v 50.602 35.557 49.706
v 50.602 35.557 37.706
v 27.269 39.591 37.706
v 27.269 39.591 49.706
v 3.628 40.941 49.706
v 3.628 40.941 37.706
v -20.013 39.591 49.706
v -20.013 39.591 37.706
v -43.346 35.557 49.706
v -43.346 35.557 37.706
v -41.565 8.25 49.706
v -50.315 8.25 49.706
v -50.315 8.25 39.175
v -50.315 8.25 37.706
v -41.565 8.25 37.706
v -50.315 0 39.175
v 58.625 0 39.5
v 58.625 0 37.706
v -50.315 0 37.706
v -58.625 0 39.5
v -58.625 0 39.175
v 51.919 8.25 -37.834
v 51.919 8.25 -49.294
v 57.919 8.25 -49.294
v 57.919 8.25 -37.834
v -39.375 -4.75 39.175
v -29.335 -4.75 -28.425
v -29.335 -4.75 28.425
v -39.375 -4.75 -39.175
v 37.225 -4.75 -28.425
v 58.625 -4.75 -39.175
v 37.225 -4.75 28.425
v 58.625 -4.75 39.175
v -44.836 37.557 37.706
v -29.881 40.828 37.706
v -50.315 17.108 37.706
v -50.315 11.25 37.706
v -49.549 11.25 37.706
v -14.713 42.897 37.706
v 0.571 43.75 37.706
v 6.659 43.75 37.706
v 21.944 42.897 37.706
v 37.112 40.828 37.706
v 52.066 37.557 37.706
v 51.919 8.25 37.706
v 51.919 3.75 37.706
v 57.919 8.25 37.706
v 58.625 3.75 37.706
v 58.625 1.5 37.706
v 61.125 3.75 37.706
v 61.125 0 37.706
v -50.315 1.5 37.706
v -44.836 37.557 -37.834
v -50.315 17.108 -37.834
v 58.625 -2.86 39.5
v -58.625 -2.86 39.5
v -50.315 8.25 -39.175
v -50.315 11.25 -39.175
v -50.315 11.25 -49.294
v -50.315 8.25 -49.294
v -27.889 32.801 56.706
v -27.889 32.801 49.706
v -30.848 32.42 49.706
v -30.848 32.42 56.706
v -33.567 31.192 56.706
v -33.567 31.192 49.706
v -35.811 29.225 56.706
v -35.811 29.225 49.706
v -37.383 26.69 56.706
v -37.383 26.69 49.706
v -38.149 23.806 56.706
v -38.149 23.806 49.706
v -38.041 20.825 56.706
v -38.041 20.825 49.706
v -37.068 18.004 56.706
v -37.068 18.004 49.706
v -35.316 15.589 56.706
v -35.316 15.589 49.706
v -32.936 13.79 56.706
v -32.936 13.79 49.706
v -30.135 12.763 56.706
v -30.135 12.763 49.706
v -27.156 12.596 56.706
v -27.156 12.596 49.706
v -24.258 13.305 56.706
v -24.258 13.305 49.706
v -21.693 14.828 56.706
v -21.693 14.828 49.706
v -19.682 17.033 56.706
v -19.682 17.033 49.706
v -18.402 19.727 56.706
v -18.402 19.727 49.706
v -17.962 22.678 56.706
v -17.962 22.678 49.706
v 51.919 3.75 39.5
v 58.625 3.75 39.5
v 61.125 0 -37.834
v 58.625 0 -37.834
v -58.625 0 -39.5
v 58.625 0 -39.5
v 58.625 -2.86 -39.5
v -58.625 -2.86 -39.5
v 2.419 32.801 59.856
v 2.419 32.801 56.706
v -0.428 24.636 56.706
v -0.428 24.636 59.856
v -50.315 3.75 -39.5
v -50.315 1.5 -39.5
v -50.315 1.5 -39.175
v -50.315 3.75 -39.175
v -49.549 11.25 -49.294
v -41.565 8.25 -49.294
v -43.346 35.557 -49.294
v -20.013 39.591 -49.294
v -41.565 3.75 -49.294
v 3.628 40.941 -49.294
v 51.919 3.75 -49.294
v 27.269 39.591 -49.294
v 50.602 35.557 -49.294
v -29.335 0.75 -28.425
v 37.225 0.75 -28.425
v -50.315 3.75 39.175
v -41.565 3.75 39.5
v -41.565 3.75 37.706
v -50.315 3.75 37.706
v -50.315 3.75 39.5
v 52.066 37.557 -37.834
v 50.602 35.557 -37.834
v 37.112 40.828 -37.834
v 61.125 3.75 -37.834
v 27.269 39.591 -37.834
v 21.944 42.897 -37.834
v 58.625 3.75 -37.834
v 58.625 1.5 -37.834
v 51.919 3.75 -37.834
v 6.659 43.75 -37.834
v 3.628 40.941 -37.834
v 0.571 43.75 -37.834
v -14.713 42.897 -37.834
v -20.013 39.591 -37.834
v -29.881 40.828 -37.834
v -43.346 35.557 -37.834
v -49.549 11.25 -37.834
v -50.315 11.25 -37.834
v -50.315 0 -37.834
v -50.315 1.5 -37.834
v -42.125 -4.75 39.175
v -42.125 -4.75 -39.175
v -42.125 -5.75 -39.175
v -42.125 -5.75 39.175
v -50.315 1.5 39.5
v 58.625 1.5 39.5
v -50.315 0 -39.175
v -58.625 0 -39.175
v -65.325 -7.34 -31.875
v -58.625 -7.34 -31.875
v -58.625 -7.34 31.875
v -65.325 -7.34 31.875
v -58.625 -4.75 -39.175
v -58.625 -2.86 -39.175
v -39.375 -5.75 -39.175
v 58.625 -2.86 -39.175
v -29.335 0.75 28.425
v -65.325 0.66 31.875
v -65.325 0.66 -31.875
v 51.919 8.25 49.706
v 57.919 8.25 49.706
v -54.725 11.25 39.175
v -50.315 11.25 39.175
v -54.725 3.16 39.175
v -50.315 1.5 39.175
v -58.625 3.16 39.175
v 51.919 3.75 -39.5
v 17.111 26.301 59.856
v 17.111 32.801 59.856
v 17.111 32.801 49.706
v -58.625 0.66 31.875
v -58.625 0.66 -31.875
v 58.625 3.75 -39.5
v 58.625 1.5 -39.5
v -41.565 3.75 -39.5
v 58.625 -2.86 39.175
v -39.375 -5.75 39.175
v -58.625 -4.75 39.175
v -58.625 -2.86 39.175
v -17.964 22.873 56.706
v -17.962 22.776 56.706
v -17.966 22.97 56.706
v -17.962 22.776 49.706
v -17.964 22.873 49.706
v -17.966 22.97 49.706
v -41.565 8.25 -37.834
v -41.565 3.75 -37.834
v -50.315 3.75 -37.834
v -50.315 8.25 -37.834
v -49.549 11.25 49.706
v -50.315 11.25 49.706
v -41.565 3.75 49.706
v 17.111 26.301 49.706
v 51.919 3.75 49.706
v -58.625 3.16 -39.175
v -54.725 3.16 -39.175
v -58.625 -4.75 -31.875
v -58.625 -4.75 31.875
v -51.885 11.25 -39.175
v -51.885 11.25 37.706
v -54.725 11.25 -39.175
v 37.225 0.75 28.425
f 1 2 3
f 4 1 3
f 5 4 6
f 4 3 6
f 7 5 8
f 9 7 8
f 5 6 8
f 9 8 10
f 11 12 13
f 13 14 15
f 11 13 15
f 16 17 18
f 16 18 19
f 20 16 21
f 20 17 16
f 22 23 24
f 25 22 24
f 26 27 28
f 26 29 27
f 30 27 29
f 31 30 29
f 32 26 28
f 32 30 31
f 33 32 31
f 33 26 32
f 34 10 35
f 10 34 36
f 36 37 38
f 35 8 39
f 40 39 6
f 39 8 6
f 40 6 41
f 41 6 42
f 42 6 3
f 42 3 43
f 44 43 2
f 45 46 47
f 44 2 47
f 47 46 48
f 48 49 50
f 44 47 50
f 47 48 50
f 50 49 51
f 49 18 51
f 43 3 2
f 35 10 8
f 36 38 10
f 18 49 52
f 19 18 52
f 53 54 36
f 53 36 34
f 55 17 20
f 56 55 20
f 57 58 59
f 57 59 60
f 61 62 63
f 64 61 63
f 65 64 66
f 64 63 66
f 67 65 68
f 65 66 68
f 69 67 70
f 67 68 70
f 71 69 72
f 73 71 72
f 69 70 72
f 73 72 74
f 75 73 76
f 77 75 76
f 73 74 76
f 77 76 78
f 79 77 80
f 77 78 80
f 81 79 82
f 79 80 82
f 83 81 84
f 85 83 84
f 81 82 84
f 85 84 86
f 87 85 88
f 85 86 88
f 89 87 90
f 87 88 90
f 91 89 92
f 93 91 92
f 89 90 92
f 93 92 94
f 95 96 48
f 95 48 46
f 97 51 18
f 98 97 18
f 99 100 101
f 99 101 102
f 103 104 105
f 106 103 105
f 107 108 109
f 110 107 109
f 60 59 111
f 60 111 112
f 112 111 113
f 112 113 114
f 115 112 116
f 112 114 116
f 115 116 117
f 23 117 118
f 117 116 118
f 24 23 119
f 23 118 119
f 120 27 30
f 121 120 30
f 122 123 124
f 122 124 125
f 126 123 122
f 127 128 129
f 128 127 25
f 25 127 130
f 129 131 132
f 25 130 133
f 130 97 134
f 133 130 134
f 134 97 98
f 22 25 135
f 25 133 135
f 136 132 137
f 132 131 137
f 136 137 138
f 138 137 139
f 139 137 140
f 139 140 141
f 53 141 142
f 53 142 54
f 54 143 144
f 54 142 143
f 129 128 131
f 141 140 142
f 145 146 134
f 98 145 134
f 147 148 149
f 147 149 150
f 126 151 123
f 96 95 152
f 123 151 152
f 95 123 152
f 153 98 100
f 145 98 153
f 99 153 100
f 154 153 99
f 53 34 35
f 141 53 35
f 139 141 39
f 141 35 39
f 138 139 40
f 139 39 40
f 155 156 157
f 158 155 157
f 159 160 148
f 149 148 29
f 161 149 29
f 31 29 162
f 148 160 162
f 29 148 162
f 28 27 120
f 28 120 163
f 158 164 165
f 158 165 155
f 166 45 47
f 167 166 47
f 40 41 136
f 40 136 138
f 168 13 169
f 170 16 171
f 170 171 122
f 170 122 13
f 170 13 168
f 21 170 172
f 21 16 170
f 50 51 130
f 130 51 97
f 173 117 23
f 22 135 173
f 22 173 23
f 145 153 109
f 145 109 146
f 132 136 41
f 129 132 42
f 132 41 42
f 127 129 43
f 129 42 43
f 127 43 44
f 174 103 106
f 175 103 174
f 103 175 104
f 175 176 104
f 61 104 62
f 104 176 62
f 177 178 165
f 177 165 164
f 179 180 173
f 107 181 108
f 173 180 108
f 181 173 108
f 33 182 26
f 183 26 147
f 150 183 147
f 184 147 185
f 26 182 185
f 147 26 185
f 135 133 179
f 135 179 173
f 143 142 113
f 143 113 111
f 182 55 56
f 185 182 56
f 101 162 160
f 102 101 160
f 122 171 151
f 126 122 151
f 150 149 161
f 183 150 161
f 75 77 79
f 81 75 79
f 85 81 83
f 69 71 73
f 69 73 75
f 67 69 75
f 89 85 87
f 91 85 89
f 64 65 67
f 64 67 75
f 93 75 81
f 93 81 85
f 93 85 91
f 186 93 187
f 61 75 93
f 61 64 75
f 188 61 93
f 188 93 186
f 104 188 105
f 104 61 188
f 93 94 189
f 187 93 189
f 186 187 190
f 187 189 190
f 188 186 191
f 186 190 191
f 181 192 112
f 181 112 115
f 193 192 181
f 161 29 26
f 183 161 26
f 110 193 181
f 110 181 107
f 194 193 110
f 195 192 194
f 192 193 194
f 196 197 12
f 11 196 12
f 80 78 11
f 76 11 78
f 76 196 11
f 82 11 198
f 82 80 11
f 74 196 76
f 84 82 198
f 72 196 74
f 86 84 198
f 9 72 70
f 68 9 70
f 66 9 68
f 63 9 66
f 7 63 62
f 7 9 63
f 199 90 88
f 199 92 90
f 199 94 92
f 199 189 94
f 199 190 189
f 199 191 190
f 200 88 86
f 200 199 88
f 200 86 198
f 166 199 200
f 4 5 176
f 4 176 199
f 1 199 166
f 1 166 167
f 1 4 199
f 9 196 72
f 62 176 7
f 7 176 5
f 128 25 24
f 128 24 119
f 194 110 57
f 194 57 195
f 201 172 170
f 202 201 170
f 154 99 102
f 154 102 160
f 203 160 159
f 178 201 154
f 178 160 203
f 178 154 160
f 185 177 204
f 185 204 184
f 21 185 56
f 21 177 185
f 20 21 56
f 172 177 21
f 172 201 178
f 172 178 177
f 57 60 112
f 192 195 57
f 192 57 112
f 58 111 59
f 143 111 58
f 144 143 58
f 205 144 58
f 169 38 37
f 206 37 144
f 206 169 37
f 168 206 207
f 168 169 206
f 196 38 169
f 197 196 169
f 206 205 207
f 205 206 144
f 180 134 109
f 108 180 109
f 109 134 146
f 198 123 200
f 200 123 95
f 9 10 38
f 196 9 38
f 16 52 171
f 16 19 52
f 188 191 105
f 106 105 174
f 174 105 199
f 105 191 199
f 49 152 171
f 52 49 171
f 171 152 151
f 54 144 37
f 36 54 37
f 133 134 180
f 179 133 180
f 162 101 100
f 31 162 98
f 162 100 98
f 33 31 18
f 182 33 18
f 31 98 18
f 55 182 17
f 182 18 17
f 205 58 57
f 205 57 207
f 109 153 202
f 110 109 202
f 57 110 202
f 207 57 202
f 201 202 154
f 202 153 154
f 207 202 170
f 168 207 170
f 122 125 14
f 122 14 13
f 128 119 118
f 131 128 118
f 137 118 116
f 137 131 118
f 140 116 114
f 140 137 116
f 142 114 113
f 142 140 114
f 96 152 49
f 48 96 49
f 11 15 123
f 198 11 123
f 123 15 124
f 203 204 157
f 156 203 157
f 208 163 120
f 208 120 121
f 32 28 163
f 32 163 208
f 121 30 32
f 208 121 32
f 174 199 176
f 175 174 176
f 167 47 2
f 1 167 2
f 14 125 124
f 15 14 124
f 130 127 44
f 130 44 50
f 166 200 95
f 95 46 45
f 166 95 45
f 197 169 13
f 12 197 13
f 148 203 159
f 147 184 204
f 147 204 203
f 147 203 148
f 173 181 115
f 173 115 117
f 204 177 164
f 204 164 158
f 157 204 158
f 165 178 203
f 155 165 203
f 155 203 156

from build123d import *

# Parameters (mm, degrees)
F0_W           = 98
F0_H           = 78.35
F0_W_2         = 2.5
F0_W_3         = 16.75
F1_DEPTH       = 4.75
F2_W           = 2.75
F2_H           = 78.35
F3_DEPTH       = 1
F4_W           = 66.56
F4_H           = 56.85
F5_DEPTH       = 25
F6_W           = 117.25
F6_H           = 79
F7_DEPTH       = 2.86
F8_W           = 3.9
F8_H           = 78.35
F9_DEPTH       = 7.91
F10_W          = 8.31
F10_H          = 78.35
F11_DEPTH      = 6.5
F12_W          = 111.44
F12_H          = 75.54
F13_DEPTH      = 1.5
F14_W          = 4.41
F14_H          = 78.35
F15_DEPTH      = 9.5
F17_DEPTH      = 2.25
F19_DEPTH      = 40
F21_DEPTH      = 95.3
F23_DEPTH      = 12
F23_DEPTH_BACK = 87
F25_DEPTH      = 7
F27_DEPTH      = 3.15
F28_W          = 8
F28_H          = 63.75
F29_DEPTH      = 6.7
F30_W          = 66.56
F30_H          = 56.85
F31_DEPTH      = 5.5


with BuildPart() as f1:
    # F0 (on Front) → F1 (new body)
    with BuildSketch(Plane.XZ):
        with Locations((9.625, 0)):
            Rectangle(F0_W, F0_H)
        with Locations((-40.625, 0)):
            Rectangle(F0_W_2, F0_H)
        with Locations((-50.25, 0)):
            Rectangle(F0_W_3, F0_H)
    extrude(amount=F1_DEPTH)

    # F2 (on face) → F3 (join)
    with BuildSketch(Plane.XZ.offset(4.75)):
        with Locations((-40.75, 0)):
            Rectangle(F2_W, F2_H)
    extrude(amount=F3_DEPTH)

    # F4 (on face) → F5 (cut)
    with BuildSketch(Plane.XZ.offset(4.75)):
        with Locations((3.945, 0)):
            Rectangle(F4_W, F4_H)
    extrude(amount=-F5_DEPTH, mode=Mode.SUBTRACT)

    # F6 (on face) → F7 (join)
    with BuildSketch(Plane(origin=(0, 0, 0), x_dir=(-1, 0, 0), z_dir=(0, 1, 0))):
        Rectangle(F6_W, F6_H)
    extrude(amount=-F7_DEPTH)

    # F8 (on face) → F9 (join)
    with BuildSketch(Plane.XZ.offset(4.75)):
        with Locations((-56.675, 0)):
            Rectangle(F8_W, F8_H)
    extrude(amount=-F9_DEPTH)

    # F10 (on face) → F11 (join)
    with BuildSketch(Plane.XZ.offset(4.75)):
        with Locations((-54.47, 0)):
            Rectangle(F10_W, F10_H)
    extrude(amount=-F11_DEPTH)

    # F12 (on face) → F13 (join)
    with BuildSketch(Plane(origin=(0, 0, 0), x_dir=(-1, 0, 0), z_dir=(0, 1, 0))):
        with Locations((-5.405, -0.063661)):
            Rectangle(F12_W, F12_H)
    extrude(amount=F13_DEPTH)

    # F14 (on face) → F15 (join)
    with BuildSketch(Plane(origin=(0, 1.75, 0), x_dir=(-1, 0, 0), z_dir=(0, 1, 0))):
        with Locations((52.52, 0)):
            Rectangle(F14_W, F14_H)
    extrude(amount=F15_DEPTH)

    # F16 (on face) → F17 (join)
    with BuildSketch(Plane(origin=(0, 1.5, 0), x_dir=(-1, 0, 0), z_dir=(0, 1, 0))):
        Polygon((50.315, 39.5), (-58.625, 39.5), (-58.625, 37.706339), (-61.125, 37.706339), (-61.125, -37.833661), (-58.625, -37.833661), (-58.625, -39.5), (50.315, -39.5), align=None)
    extrude(amount=F17_DEPTH)

    # F18 (on face) → F19 (join)
    with BuildSketch(Plane(origin=(0, 3.75, 0), x_dir=(-1, 0, 0), z_dir=(0, 1, 0))):
        Polygon((-58.625, 37.706339), (-61.125, 37.706339), (-61.125, -37.833661), (-58.625, -37.833661), (50.315, -37.833661), (50.315, 37.706339), align=None)
    extrude(amount=F19_DEPTH)

    # F20 (on face) → F21 (cut)
    with BuildSketch(Plane.XY.offset(37.706339)):
        with BuildLine():
            Line((52.066333, 37.557404), (61.125, 3.75))
            Line((61.125, 3.75), (71.237857, 49.97474))
            Line((71.237857, 49.97474), (-55.704342, 49.97474))
            Line((-55.704342, 49.97474), (-51.884619, 11.25))
            Line((-51.884619, 11.25), (-44.835571, 37.557404))
            ThreePointArc((-44.835571, 37.557404), (3.615381, 43.774144), (52.066333, 37.557404))
        make_face()
    extrude(amount=-F21_DEPTH, mode=Mode.SUBTRACT)

    # F22 (on face) → F23 (join, two sides)
    with BuildSketch(Plane.XY.offset(37.706339)) as f23_sk:
        with BuildLine():
            Line((-50.315, 11.25), (-50.315, 8.25))
            Line((-50.315, 8.25), (-41.565, 8.25))
            Line((-41.565, 8.25), (-41.565, 3.75))
            Line((-41.565, 3.75), (51.919229, 3.75))
            Line((51.919229, 3.75), (51.919229, 8.25))
            Line((51.919229, 8.25), (57.919229, 8.25))
            Line((57.919229, 8.25), (50.602232, 35.557404))
            ThreePointArc((50.602232, 35.557404), (3.628124, 40.940752), (-43.345984, 35.557404))
            Line((-43.345984, 35.557404), (-49.549382, 11.25))
            Line((-49.549382, 11.25), (-50.315, 11.25))
        make_face()
    extrude(amount=F23_DEPTH)
    extrude(f23_sk.sketch, amount=-F23_DEPTH_BACK)

    # F24 (on face) → F25 (join)
    with BuildSketch(Plane.XY.offset(49.706339)):
        with BuildLine():
            ThreePointArc((-27.889039, 32.801446), (-35.316112, 15.589262), (-17.962004, 22.678382))
            ThreePointArc((-17.962004, 22.678382), (-17.963055, 22.824296), (-17.966209, 22.97018))
            ThreePointArc((-17.966209, 22.97018), (-20.960809, 29.870946), (-27.889039, 32.801446))
        make_face()
        with BuildLine():
            ThreePointArc((-27.889039, 32.801446), (-20.960809, 29.870946), (-17.966209, 22.97018))
            Line((-17.966209, 22.97018), (17.110961, 26.301446))
            Line((17.110961, 26.301446), (17.110961, 32.801446))
            Line((17.110961, 32.801446), (-27.889039, 32.801446))
        make_face()
    extrude(amount=F25_DEPTH)

    # F26 (on face) → F27 (join)
    with BuildSketch(Plane.XY.offset(56.706339)):
        Polygon((17.110961, 26.301446), (17.110961, 32.801446), (2.419159, 32.801446), (-0.427624, 24.635813), align=None)
    extrude(amount=F27_DEPTH)

    # F28 (on face) → F29 (join)
    with BuildSketch(Plane(origin=(-58.625, 0, 0), x_dir=(0, -1, 0), z_dir=(-1, 0, 0))):
        with Locations((3.34, 0)):
            Rectangle(F28_W, F28_H)
    extrude(amount=F29_DEPTH)

    # F30 (on face) → F31 (cut)
    with BuildSketch(Plane.XZ.offset(4.75)):
        with Locations((3.945, 0)):
            Rectangle(F30_W, F30_H)
    extrude(amount=-F31_DEPTH, mode=Mode.SUBTRACT)


solid = f1.part
